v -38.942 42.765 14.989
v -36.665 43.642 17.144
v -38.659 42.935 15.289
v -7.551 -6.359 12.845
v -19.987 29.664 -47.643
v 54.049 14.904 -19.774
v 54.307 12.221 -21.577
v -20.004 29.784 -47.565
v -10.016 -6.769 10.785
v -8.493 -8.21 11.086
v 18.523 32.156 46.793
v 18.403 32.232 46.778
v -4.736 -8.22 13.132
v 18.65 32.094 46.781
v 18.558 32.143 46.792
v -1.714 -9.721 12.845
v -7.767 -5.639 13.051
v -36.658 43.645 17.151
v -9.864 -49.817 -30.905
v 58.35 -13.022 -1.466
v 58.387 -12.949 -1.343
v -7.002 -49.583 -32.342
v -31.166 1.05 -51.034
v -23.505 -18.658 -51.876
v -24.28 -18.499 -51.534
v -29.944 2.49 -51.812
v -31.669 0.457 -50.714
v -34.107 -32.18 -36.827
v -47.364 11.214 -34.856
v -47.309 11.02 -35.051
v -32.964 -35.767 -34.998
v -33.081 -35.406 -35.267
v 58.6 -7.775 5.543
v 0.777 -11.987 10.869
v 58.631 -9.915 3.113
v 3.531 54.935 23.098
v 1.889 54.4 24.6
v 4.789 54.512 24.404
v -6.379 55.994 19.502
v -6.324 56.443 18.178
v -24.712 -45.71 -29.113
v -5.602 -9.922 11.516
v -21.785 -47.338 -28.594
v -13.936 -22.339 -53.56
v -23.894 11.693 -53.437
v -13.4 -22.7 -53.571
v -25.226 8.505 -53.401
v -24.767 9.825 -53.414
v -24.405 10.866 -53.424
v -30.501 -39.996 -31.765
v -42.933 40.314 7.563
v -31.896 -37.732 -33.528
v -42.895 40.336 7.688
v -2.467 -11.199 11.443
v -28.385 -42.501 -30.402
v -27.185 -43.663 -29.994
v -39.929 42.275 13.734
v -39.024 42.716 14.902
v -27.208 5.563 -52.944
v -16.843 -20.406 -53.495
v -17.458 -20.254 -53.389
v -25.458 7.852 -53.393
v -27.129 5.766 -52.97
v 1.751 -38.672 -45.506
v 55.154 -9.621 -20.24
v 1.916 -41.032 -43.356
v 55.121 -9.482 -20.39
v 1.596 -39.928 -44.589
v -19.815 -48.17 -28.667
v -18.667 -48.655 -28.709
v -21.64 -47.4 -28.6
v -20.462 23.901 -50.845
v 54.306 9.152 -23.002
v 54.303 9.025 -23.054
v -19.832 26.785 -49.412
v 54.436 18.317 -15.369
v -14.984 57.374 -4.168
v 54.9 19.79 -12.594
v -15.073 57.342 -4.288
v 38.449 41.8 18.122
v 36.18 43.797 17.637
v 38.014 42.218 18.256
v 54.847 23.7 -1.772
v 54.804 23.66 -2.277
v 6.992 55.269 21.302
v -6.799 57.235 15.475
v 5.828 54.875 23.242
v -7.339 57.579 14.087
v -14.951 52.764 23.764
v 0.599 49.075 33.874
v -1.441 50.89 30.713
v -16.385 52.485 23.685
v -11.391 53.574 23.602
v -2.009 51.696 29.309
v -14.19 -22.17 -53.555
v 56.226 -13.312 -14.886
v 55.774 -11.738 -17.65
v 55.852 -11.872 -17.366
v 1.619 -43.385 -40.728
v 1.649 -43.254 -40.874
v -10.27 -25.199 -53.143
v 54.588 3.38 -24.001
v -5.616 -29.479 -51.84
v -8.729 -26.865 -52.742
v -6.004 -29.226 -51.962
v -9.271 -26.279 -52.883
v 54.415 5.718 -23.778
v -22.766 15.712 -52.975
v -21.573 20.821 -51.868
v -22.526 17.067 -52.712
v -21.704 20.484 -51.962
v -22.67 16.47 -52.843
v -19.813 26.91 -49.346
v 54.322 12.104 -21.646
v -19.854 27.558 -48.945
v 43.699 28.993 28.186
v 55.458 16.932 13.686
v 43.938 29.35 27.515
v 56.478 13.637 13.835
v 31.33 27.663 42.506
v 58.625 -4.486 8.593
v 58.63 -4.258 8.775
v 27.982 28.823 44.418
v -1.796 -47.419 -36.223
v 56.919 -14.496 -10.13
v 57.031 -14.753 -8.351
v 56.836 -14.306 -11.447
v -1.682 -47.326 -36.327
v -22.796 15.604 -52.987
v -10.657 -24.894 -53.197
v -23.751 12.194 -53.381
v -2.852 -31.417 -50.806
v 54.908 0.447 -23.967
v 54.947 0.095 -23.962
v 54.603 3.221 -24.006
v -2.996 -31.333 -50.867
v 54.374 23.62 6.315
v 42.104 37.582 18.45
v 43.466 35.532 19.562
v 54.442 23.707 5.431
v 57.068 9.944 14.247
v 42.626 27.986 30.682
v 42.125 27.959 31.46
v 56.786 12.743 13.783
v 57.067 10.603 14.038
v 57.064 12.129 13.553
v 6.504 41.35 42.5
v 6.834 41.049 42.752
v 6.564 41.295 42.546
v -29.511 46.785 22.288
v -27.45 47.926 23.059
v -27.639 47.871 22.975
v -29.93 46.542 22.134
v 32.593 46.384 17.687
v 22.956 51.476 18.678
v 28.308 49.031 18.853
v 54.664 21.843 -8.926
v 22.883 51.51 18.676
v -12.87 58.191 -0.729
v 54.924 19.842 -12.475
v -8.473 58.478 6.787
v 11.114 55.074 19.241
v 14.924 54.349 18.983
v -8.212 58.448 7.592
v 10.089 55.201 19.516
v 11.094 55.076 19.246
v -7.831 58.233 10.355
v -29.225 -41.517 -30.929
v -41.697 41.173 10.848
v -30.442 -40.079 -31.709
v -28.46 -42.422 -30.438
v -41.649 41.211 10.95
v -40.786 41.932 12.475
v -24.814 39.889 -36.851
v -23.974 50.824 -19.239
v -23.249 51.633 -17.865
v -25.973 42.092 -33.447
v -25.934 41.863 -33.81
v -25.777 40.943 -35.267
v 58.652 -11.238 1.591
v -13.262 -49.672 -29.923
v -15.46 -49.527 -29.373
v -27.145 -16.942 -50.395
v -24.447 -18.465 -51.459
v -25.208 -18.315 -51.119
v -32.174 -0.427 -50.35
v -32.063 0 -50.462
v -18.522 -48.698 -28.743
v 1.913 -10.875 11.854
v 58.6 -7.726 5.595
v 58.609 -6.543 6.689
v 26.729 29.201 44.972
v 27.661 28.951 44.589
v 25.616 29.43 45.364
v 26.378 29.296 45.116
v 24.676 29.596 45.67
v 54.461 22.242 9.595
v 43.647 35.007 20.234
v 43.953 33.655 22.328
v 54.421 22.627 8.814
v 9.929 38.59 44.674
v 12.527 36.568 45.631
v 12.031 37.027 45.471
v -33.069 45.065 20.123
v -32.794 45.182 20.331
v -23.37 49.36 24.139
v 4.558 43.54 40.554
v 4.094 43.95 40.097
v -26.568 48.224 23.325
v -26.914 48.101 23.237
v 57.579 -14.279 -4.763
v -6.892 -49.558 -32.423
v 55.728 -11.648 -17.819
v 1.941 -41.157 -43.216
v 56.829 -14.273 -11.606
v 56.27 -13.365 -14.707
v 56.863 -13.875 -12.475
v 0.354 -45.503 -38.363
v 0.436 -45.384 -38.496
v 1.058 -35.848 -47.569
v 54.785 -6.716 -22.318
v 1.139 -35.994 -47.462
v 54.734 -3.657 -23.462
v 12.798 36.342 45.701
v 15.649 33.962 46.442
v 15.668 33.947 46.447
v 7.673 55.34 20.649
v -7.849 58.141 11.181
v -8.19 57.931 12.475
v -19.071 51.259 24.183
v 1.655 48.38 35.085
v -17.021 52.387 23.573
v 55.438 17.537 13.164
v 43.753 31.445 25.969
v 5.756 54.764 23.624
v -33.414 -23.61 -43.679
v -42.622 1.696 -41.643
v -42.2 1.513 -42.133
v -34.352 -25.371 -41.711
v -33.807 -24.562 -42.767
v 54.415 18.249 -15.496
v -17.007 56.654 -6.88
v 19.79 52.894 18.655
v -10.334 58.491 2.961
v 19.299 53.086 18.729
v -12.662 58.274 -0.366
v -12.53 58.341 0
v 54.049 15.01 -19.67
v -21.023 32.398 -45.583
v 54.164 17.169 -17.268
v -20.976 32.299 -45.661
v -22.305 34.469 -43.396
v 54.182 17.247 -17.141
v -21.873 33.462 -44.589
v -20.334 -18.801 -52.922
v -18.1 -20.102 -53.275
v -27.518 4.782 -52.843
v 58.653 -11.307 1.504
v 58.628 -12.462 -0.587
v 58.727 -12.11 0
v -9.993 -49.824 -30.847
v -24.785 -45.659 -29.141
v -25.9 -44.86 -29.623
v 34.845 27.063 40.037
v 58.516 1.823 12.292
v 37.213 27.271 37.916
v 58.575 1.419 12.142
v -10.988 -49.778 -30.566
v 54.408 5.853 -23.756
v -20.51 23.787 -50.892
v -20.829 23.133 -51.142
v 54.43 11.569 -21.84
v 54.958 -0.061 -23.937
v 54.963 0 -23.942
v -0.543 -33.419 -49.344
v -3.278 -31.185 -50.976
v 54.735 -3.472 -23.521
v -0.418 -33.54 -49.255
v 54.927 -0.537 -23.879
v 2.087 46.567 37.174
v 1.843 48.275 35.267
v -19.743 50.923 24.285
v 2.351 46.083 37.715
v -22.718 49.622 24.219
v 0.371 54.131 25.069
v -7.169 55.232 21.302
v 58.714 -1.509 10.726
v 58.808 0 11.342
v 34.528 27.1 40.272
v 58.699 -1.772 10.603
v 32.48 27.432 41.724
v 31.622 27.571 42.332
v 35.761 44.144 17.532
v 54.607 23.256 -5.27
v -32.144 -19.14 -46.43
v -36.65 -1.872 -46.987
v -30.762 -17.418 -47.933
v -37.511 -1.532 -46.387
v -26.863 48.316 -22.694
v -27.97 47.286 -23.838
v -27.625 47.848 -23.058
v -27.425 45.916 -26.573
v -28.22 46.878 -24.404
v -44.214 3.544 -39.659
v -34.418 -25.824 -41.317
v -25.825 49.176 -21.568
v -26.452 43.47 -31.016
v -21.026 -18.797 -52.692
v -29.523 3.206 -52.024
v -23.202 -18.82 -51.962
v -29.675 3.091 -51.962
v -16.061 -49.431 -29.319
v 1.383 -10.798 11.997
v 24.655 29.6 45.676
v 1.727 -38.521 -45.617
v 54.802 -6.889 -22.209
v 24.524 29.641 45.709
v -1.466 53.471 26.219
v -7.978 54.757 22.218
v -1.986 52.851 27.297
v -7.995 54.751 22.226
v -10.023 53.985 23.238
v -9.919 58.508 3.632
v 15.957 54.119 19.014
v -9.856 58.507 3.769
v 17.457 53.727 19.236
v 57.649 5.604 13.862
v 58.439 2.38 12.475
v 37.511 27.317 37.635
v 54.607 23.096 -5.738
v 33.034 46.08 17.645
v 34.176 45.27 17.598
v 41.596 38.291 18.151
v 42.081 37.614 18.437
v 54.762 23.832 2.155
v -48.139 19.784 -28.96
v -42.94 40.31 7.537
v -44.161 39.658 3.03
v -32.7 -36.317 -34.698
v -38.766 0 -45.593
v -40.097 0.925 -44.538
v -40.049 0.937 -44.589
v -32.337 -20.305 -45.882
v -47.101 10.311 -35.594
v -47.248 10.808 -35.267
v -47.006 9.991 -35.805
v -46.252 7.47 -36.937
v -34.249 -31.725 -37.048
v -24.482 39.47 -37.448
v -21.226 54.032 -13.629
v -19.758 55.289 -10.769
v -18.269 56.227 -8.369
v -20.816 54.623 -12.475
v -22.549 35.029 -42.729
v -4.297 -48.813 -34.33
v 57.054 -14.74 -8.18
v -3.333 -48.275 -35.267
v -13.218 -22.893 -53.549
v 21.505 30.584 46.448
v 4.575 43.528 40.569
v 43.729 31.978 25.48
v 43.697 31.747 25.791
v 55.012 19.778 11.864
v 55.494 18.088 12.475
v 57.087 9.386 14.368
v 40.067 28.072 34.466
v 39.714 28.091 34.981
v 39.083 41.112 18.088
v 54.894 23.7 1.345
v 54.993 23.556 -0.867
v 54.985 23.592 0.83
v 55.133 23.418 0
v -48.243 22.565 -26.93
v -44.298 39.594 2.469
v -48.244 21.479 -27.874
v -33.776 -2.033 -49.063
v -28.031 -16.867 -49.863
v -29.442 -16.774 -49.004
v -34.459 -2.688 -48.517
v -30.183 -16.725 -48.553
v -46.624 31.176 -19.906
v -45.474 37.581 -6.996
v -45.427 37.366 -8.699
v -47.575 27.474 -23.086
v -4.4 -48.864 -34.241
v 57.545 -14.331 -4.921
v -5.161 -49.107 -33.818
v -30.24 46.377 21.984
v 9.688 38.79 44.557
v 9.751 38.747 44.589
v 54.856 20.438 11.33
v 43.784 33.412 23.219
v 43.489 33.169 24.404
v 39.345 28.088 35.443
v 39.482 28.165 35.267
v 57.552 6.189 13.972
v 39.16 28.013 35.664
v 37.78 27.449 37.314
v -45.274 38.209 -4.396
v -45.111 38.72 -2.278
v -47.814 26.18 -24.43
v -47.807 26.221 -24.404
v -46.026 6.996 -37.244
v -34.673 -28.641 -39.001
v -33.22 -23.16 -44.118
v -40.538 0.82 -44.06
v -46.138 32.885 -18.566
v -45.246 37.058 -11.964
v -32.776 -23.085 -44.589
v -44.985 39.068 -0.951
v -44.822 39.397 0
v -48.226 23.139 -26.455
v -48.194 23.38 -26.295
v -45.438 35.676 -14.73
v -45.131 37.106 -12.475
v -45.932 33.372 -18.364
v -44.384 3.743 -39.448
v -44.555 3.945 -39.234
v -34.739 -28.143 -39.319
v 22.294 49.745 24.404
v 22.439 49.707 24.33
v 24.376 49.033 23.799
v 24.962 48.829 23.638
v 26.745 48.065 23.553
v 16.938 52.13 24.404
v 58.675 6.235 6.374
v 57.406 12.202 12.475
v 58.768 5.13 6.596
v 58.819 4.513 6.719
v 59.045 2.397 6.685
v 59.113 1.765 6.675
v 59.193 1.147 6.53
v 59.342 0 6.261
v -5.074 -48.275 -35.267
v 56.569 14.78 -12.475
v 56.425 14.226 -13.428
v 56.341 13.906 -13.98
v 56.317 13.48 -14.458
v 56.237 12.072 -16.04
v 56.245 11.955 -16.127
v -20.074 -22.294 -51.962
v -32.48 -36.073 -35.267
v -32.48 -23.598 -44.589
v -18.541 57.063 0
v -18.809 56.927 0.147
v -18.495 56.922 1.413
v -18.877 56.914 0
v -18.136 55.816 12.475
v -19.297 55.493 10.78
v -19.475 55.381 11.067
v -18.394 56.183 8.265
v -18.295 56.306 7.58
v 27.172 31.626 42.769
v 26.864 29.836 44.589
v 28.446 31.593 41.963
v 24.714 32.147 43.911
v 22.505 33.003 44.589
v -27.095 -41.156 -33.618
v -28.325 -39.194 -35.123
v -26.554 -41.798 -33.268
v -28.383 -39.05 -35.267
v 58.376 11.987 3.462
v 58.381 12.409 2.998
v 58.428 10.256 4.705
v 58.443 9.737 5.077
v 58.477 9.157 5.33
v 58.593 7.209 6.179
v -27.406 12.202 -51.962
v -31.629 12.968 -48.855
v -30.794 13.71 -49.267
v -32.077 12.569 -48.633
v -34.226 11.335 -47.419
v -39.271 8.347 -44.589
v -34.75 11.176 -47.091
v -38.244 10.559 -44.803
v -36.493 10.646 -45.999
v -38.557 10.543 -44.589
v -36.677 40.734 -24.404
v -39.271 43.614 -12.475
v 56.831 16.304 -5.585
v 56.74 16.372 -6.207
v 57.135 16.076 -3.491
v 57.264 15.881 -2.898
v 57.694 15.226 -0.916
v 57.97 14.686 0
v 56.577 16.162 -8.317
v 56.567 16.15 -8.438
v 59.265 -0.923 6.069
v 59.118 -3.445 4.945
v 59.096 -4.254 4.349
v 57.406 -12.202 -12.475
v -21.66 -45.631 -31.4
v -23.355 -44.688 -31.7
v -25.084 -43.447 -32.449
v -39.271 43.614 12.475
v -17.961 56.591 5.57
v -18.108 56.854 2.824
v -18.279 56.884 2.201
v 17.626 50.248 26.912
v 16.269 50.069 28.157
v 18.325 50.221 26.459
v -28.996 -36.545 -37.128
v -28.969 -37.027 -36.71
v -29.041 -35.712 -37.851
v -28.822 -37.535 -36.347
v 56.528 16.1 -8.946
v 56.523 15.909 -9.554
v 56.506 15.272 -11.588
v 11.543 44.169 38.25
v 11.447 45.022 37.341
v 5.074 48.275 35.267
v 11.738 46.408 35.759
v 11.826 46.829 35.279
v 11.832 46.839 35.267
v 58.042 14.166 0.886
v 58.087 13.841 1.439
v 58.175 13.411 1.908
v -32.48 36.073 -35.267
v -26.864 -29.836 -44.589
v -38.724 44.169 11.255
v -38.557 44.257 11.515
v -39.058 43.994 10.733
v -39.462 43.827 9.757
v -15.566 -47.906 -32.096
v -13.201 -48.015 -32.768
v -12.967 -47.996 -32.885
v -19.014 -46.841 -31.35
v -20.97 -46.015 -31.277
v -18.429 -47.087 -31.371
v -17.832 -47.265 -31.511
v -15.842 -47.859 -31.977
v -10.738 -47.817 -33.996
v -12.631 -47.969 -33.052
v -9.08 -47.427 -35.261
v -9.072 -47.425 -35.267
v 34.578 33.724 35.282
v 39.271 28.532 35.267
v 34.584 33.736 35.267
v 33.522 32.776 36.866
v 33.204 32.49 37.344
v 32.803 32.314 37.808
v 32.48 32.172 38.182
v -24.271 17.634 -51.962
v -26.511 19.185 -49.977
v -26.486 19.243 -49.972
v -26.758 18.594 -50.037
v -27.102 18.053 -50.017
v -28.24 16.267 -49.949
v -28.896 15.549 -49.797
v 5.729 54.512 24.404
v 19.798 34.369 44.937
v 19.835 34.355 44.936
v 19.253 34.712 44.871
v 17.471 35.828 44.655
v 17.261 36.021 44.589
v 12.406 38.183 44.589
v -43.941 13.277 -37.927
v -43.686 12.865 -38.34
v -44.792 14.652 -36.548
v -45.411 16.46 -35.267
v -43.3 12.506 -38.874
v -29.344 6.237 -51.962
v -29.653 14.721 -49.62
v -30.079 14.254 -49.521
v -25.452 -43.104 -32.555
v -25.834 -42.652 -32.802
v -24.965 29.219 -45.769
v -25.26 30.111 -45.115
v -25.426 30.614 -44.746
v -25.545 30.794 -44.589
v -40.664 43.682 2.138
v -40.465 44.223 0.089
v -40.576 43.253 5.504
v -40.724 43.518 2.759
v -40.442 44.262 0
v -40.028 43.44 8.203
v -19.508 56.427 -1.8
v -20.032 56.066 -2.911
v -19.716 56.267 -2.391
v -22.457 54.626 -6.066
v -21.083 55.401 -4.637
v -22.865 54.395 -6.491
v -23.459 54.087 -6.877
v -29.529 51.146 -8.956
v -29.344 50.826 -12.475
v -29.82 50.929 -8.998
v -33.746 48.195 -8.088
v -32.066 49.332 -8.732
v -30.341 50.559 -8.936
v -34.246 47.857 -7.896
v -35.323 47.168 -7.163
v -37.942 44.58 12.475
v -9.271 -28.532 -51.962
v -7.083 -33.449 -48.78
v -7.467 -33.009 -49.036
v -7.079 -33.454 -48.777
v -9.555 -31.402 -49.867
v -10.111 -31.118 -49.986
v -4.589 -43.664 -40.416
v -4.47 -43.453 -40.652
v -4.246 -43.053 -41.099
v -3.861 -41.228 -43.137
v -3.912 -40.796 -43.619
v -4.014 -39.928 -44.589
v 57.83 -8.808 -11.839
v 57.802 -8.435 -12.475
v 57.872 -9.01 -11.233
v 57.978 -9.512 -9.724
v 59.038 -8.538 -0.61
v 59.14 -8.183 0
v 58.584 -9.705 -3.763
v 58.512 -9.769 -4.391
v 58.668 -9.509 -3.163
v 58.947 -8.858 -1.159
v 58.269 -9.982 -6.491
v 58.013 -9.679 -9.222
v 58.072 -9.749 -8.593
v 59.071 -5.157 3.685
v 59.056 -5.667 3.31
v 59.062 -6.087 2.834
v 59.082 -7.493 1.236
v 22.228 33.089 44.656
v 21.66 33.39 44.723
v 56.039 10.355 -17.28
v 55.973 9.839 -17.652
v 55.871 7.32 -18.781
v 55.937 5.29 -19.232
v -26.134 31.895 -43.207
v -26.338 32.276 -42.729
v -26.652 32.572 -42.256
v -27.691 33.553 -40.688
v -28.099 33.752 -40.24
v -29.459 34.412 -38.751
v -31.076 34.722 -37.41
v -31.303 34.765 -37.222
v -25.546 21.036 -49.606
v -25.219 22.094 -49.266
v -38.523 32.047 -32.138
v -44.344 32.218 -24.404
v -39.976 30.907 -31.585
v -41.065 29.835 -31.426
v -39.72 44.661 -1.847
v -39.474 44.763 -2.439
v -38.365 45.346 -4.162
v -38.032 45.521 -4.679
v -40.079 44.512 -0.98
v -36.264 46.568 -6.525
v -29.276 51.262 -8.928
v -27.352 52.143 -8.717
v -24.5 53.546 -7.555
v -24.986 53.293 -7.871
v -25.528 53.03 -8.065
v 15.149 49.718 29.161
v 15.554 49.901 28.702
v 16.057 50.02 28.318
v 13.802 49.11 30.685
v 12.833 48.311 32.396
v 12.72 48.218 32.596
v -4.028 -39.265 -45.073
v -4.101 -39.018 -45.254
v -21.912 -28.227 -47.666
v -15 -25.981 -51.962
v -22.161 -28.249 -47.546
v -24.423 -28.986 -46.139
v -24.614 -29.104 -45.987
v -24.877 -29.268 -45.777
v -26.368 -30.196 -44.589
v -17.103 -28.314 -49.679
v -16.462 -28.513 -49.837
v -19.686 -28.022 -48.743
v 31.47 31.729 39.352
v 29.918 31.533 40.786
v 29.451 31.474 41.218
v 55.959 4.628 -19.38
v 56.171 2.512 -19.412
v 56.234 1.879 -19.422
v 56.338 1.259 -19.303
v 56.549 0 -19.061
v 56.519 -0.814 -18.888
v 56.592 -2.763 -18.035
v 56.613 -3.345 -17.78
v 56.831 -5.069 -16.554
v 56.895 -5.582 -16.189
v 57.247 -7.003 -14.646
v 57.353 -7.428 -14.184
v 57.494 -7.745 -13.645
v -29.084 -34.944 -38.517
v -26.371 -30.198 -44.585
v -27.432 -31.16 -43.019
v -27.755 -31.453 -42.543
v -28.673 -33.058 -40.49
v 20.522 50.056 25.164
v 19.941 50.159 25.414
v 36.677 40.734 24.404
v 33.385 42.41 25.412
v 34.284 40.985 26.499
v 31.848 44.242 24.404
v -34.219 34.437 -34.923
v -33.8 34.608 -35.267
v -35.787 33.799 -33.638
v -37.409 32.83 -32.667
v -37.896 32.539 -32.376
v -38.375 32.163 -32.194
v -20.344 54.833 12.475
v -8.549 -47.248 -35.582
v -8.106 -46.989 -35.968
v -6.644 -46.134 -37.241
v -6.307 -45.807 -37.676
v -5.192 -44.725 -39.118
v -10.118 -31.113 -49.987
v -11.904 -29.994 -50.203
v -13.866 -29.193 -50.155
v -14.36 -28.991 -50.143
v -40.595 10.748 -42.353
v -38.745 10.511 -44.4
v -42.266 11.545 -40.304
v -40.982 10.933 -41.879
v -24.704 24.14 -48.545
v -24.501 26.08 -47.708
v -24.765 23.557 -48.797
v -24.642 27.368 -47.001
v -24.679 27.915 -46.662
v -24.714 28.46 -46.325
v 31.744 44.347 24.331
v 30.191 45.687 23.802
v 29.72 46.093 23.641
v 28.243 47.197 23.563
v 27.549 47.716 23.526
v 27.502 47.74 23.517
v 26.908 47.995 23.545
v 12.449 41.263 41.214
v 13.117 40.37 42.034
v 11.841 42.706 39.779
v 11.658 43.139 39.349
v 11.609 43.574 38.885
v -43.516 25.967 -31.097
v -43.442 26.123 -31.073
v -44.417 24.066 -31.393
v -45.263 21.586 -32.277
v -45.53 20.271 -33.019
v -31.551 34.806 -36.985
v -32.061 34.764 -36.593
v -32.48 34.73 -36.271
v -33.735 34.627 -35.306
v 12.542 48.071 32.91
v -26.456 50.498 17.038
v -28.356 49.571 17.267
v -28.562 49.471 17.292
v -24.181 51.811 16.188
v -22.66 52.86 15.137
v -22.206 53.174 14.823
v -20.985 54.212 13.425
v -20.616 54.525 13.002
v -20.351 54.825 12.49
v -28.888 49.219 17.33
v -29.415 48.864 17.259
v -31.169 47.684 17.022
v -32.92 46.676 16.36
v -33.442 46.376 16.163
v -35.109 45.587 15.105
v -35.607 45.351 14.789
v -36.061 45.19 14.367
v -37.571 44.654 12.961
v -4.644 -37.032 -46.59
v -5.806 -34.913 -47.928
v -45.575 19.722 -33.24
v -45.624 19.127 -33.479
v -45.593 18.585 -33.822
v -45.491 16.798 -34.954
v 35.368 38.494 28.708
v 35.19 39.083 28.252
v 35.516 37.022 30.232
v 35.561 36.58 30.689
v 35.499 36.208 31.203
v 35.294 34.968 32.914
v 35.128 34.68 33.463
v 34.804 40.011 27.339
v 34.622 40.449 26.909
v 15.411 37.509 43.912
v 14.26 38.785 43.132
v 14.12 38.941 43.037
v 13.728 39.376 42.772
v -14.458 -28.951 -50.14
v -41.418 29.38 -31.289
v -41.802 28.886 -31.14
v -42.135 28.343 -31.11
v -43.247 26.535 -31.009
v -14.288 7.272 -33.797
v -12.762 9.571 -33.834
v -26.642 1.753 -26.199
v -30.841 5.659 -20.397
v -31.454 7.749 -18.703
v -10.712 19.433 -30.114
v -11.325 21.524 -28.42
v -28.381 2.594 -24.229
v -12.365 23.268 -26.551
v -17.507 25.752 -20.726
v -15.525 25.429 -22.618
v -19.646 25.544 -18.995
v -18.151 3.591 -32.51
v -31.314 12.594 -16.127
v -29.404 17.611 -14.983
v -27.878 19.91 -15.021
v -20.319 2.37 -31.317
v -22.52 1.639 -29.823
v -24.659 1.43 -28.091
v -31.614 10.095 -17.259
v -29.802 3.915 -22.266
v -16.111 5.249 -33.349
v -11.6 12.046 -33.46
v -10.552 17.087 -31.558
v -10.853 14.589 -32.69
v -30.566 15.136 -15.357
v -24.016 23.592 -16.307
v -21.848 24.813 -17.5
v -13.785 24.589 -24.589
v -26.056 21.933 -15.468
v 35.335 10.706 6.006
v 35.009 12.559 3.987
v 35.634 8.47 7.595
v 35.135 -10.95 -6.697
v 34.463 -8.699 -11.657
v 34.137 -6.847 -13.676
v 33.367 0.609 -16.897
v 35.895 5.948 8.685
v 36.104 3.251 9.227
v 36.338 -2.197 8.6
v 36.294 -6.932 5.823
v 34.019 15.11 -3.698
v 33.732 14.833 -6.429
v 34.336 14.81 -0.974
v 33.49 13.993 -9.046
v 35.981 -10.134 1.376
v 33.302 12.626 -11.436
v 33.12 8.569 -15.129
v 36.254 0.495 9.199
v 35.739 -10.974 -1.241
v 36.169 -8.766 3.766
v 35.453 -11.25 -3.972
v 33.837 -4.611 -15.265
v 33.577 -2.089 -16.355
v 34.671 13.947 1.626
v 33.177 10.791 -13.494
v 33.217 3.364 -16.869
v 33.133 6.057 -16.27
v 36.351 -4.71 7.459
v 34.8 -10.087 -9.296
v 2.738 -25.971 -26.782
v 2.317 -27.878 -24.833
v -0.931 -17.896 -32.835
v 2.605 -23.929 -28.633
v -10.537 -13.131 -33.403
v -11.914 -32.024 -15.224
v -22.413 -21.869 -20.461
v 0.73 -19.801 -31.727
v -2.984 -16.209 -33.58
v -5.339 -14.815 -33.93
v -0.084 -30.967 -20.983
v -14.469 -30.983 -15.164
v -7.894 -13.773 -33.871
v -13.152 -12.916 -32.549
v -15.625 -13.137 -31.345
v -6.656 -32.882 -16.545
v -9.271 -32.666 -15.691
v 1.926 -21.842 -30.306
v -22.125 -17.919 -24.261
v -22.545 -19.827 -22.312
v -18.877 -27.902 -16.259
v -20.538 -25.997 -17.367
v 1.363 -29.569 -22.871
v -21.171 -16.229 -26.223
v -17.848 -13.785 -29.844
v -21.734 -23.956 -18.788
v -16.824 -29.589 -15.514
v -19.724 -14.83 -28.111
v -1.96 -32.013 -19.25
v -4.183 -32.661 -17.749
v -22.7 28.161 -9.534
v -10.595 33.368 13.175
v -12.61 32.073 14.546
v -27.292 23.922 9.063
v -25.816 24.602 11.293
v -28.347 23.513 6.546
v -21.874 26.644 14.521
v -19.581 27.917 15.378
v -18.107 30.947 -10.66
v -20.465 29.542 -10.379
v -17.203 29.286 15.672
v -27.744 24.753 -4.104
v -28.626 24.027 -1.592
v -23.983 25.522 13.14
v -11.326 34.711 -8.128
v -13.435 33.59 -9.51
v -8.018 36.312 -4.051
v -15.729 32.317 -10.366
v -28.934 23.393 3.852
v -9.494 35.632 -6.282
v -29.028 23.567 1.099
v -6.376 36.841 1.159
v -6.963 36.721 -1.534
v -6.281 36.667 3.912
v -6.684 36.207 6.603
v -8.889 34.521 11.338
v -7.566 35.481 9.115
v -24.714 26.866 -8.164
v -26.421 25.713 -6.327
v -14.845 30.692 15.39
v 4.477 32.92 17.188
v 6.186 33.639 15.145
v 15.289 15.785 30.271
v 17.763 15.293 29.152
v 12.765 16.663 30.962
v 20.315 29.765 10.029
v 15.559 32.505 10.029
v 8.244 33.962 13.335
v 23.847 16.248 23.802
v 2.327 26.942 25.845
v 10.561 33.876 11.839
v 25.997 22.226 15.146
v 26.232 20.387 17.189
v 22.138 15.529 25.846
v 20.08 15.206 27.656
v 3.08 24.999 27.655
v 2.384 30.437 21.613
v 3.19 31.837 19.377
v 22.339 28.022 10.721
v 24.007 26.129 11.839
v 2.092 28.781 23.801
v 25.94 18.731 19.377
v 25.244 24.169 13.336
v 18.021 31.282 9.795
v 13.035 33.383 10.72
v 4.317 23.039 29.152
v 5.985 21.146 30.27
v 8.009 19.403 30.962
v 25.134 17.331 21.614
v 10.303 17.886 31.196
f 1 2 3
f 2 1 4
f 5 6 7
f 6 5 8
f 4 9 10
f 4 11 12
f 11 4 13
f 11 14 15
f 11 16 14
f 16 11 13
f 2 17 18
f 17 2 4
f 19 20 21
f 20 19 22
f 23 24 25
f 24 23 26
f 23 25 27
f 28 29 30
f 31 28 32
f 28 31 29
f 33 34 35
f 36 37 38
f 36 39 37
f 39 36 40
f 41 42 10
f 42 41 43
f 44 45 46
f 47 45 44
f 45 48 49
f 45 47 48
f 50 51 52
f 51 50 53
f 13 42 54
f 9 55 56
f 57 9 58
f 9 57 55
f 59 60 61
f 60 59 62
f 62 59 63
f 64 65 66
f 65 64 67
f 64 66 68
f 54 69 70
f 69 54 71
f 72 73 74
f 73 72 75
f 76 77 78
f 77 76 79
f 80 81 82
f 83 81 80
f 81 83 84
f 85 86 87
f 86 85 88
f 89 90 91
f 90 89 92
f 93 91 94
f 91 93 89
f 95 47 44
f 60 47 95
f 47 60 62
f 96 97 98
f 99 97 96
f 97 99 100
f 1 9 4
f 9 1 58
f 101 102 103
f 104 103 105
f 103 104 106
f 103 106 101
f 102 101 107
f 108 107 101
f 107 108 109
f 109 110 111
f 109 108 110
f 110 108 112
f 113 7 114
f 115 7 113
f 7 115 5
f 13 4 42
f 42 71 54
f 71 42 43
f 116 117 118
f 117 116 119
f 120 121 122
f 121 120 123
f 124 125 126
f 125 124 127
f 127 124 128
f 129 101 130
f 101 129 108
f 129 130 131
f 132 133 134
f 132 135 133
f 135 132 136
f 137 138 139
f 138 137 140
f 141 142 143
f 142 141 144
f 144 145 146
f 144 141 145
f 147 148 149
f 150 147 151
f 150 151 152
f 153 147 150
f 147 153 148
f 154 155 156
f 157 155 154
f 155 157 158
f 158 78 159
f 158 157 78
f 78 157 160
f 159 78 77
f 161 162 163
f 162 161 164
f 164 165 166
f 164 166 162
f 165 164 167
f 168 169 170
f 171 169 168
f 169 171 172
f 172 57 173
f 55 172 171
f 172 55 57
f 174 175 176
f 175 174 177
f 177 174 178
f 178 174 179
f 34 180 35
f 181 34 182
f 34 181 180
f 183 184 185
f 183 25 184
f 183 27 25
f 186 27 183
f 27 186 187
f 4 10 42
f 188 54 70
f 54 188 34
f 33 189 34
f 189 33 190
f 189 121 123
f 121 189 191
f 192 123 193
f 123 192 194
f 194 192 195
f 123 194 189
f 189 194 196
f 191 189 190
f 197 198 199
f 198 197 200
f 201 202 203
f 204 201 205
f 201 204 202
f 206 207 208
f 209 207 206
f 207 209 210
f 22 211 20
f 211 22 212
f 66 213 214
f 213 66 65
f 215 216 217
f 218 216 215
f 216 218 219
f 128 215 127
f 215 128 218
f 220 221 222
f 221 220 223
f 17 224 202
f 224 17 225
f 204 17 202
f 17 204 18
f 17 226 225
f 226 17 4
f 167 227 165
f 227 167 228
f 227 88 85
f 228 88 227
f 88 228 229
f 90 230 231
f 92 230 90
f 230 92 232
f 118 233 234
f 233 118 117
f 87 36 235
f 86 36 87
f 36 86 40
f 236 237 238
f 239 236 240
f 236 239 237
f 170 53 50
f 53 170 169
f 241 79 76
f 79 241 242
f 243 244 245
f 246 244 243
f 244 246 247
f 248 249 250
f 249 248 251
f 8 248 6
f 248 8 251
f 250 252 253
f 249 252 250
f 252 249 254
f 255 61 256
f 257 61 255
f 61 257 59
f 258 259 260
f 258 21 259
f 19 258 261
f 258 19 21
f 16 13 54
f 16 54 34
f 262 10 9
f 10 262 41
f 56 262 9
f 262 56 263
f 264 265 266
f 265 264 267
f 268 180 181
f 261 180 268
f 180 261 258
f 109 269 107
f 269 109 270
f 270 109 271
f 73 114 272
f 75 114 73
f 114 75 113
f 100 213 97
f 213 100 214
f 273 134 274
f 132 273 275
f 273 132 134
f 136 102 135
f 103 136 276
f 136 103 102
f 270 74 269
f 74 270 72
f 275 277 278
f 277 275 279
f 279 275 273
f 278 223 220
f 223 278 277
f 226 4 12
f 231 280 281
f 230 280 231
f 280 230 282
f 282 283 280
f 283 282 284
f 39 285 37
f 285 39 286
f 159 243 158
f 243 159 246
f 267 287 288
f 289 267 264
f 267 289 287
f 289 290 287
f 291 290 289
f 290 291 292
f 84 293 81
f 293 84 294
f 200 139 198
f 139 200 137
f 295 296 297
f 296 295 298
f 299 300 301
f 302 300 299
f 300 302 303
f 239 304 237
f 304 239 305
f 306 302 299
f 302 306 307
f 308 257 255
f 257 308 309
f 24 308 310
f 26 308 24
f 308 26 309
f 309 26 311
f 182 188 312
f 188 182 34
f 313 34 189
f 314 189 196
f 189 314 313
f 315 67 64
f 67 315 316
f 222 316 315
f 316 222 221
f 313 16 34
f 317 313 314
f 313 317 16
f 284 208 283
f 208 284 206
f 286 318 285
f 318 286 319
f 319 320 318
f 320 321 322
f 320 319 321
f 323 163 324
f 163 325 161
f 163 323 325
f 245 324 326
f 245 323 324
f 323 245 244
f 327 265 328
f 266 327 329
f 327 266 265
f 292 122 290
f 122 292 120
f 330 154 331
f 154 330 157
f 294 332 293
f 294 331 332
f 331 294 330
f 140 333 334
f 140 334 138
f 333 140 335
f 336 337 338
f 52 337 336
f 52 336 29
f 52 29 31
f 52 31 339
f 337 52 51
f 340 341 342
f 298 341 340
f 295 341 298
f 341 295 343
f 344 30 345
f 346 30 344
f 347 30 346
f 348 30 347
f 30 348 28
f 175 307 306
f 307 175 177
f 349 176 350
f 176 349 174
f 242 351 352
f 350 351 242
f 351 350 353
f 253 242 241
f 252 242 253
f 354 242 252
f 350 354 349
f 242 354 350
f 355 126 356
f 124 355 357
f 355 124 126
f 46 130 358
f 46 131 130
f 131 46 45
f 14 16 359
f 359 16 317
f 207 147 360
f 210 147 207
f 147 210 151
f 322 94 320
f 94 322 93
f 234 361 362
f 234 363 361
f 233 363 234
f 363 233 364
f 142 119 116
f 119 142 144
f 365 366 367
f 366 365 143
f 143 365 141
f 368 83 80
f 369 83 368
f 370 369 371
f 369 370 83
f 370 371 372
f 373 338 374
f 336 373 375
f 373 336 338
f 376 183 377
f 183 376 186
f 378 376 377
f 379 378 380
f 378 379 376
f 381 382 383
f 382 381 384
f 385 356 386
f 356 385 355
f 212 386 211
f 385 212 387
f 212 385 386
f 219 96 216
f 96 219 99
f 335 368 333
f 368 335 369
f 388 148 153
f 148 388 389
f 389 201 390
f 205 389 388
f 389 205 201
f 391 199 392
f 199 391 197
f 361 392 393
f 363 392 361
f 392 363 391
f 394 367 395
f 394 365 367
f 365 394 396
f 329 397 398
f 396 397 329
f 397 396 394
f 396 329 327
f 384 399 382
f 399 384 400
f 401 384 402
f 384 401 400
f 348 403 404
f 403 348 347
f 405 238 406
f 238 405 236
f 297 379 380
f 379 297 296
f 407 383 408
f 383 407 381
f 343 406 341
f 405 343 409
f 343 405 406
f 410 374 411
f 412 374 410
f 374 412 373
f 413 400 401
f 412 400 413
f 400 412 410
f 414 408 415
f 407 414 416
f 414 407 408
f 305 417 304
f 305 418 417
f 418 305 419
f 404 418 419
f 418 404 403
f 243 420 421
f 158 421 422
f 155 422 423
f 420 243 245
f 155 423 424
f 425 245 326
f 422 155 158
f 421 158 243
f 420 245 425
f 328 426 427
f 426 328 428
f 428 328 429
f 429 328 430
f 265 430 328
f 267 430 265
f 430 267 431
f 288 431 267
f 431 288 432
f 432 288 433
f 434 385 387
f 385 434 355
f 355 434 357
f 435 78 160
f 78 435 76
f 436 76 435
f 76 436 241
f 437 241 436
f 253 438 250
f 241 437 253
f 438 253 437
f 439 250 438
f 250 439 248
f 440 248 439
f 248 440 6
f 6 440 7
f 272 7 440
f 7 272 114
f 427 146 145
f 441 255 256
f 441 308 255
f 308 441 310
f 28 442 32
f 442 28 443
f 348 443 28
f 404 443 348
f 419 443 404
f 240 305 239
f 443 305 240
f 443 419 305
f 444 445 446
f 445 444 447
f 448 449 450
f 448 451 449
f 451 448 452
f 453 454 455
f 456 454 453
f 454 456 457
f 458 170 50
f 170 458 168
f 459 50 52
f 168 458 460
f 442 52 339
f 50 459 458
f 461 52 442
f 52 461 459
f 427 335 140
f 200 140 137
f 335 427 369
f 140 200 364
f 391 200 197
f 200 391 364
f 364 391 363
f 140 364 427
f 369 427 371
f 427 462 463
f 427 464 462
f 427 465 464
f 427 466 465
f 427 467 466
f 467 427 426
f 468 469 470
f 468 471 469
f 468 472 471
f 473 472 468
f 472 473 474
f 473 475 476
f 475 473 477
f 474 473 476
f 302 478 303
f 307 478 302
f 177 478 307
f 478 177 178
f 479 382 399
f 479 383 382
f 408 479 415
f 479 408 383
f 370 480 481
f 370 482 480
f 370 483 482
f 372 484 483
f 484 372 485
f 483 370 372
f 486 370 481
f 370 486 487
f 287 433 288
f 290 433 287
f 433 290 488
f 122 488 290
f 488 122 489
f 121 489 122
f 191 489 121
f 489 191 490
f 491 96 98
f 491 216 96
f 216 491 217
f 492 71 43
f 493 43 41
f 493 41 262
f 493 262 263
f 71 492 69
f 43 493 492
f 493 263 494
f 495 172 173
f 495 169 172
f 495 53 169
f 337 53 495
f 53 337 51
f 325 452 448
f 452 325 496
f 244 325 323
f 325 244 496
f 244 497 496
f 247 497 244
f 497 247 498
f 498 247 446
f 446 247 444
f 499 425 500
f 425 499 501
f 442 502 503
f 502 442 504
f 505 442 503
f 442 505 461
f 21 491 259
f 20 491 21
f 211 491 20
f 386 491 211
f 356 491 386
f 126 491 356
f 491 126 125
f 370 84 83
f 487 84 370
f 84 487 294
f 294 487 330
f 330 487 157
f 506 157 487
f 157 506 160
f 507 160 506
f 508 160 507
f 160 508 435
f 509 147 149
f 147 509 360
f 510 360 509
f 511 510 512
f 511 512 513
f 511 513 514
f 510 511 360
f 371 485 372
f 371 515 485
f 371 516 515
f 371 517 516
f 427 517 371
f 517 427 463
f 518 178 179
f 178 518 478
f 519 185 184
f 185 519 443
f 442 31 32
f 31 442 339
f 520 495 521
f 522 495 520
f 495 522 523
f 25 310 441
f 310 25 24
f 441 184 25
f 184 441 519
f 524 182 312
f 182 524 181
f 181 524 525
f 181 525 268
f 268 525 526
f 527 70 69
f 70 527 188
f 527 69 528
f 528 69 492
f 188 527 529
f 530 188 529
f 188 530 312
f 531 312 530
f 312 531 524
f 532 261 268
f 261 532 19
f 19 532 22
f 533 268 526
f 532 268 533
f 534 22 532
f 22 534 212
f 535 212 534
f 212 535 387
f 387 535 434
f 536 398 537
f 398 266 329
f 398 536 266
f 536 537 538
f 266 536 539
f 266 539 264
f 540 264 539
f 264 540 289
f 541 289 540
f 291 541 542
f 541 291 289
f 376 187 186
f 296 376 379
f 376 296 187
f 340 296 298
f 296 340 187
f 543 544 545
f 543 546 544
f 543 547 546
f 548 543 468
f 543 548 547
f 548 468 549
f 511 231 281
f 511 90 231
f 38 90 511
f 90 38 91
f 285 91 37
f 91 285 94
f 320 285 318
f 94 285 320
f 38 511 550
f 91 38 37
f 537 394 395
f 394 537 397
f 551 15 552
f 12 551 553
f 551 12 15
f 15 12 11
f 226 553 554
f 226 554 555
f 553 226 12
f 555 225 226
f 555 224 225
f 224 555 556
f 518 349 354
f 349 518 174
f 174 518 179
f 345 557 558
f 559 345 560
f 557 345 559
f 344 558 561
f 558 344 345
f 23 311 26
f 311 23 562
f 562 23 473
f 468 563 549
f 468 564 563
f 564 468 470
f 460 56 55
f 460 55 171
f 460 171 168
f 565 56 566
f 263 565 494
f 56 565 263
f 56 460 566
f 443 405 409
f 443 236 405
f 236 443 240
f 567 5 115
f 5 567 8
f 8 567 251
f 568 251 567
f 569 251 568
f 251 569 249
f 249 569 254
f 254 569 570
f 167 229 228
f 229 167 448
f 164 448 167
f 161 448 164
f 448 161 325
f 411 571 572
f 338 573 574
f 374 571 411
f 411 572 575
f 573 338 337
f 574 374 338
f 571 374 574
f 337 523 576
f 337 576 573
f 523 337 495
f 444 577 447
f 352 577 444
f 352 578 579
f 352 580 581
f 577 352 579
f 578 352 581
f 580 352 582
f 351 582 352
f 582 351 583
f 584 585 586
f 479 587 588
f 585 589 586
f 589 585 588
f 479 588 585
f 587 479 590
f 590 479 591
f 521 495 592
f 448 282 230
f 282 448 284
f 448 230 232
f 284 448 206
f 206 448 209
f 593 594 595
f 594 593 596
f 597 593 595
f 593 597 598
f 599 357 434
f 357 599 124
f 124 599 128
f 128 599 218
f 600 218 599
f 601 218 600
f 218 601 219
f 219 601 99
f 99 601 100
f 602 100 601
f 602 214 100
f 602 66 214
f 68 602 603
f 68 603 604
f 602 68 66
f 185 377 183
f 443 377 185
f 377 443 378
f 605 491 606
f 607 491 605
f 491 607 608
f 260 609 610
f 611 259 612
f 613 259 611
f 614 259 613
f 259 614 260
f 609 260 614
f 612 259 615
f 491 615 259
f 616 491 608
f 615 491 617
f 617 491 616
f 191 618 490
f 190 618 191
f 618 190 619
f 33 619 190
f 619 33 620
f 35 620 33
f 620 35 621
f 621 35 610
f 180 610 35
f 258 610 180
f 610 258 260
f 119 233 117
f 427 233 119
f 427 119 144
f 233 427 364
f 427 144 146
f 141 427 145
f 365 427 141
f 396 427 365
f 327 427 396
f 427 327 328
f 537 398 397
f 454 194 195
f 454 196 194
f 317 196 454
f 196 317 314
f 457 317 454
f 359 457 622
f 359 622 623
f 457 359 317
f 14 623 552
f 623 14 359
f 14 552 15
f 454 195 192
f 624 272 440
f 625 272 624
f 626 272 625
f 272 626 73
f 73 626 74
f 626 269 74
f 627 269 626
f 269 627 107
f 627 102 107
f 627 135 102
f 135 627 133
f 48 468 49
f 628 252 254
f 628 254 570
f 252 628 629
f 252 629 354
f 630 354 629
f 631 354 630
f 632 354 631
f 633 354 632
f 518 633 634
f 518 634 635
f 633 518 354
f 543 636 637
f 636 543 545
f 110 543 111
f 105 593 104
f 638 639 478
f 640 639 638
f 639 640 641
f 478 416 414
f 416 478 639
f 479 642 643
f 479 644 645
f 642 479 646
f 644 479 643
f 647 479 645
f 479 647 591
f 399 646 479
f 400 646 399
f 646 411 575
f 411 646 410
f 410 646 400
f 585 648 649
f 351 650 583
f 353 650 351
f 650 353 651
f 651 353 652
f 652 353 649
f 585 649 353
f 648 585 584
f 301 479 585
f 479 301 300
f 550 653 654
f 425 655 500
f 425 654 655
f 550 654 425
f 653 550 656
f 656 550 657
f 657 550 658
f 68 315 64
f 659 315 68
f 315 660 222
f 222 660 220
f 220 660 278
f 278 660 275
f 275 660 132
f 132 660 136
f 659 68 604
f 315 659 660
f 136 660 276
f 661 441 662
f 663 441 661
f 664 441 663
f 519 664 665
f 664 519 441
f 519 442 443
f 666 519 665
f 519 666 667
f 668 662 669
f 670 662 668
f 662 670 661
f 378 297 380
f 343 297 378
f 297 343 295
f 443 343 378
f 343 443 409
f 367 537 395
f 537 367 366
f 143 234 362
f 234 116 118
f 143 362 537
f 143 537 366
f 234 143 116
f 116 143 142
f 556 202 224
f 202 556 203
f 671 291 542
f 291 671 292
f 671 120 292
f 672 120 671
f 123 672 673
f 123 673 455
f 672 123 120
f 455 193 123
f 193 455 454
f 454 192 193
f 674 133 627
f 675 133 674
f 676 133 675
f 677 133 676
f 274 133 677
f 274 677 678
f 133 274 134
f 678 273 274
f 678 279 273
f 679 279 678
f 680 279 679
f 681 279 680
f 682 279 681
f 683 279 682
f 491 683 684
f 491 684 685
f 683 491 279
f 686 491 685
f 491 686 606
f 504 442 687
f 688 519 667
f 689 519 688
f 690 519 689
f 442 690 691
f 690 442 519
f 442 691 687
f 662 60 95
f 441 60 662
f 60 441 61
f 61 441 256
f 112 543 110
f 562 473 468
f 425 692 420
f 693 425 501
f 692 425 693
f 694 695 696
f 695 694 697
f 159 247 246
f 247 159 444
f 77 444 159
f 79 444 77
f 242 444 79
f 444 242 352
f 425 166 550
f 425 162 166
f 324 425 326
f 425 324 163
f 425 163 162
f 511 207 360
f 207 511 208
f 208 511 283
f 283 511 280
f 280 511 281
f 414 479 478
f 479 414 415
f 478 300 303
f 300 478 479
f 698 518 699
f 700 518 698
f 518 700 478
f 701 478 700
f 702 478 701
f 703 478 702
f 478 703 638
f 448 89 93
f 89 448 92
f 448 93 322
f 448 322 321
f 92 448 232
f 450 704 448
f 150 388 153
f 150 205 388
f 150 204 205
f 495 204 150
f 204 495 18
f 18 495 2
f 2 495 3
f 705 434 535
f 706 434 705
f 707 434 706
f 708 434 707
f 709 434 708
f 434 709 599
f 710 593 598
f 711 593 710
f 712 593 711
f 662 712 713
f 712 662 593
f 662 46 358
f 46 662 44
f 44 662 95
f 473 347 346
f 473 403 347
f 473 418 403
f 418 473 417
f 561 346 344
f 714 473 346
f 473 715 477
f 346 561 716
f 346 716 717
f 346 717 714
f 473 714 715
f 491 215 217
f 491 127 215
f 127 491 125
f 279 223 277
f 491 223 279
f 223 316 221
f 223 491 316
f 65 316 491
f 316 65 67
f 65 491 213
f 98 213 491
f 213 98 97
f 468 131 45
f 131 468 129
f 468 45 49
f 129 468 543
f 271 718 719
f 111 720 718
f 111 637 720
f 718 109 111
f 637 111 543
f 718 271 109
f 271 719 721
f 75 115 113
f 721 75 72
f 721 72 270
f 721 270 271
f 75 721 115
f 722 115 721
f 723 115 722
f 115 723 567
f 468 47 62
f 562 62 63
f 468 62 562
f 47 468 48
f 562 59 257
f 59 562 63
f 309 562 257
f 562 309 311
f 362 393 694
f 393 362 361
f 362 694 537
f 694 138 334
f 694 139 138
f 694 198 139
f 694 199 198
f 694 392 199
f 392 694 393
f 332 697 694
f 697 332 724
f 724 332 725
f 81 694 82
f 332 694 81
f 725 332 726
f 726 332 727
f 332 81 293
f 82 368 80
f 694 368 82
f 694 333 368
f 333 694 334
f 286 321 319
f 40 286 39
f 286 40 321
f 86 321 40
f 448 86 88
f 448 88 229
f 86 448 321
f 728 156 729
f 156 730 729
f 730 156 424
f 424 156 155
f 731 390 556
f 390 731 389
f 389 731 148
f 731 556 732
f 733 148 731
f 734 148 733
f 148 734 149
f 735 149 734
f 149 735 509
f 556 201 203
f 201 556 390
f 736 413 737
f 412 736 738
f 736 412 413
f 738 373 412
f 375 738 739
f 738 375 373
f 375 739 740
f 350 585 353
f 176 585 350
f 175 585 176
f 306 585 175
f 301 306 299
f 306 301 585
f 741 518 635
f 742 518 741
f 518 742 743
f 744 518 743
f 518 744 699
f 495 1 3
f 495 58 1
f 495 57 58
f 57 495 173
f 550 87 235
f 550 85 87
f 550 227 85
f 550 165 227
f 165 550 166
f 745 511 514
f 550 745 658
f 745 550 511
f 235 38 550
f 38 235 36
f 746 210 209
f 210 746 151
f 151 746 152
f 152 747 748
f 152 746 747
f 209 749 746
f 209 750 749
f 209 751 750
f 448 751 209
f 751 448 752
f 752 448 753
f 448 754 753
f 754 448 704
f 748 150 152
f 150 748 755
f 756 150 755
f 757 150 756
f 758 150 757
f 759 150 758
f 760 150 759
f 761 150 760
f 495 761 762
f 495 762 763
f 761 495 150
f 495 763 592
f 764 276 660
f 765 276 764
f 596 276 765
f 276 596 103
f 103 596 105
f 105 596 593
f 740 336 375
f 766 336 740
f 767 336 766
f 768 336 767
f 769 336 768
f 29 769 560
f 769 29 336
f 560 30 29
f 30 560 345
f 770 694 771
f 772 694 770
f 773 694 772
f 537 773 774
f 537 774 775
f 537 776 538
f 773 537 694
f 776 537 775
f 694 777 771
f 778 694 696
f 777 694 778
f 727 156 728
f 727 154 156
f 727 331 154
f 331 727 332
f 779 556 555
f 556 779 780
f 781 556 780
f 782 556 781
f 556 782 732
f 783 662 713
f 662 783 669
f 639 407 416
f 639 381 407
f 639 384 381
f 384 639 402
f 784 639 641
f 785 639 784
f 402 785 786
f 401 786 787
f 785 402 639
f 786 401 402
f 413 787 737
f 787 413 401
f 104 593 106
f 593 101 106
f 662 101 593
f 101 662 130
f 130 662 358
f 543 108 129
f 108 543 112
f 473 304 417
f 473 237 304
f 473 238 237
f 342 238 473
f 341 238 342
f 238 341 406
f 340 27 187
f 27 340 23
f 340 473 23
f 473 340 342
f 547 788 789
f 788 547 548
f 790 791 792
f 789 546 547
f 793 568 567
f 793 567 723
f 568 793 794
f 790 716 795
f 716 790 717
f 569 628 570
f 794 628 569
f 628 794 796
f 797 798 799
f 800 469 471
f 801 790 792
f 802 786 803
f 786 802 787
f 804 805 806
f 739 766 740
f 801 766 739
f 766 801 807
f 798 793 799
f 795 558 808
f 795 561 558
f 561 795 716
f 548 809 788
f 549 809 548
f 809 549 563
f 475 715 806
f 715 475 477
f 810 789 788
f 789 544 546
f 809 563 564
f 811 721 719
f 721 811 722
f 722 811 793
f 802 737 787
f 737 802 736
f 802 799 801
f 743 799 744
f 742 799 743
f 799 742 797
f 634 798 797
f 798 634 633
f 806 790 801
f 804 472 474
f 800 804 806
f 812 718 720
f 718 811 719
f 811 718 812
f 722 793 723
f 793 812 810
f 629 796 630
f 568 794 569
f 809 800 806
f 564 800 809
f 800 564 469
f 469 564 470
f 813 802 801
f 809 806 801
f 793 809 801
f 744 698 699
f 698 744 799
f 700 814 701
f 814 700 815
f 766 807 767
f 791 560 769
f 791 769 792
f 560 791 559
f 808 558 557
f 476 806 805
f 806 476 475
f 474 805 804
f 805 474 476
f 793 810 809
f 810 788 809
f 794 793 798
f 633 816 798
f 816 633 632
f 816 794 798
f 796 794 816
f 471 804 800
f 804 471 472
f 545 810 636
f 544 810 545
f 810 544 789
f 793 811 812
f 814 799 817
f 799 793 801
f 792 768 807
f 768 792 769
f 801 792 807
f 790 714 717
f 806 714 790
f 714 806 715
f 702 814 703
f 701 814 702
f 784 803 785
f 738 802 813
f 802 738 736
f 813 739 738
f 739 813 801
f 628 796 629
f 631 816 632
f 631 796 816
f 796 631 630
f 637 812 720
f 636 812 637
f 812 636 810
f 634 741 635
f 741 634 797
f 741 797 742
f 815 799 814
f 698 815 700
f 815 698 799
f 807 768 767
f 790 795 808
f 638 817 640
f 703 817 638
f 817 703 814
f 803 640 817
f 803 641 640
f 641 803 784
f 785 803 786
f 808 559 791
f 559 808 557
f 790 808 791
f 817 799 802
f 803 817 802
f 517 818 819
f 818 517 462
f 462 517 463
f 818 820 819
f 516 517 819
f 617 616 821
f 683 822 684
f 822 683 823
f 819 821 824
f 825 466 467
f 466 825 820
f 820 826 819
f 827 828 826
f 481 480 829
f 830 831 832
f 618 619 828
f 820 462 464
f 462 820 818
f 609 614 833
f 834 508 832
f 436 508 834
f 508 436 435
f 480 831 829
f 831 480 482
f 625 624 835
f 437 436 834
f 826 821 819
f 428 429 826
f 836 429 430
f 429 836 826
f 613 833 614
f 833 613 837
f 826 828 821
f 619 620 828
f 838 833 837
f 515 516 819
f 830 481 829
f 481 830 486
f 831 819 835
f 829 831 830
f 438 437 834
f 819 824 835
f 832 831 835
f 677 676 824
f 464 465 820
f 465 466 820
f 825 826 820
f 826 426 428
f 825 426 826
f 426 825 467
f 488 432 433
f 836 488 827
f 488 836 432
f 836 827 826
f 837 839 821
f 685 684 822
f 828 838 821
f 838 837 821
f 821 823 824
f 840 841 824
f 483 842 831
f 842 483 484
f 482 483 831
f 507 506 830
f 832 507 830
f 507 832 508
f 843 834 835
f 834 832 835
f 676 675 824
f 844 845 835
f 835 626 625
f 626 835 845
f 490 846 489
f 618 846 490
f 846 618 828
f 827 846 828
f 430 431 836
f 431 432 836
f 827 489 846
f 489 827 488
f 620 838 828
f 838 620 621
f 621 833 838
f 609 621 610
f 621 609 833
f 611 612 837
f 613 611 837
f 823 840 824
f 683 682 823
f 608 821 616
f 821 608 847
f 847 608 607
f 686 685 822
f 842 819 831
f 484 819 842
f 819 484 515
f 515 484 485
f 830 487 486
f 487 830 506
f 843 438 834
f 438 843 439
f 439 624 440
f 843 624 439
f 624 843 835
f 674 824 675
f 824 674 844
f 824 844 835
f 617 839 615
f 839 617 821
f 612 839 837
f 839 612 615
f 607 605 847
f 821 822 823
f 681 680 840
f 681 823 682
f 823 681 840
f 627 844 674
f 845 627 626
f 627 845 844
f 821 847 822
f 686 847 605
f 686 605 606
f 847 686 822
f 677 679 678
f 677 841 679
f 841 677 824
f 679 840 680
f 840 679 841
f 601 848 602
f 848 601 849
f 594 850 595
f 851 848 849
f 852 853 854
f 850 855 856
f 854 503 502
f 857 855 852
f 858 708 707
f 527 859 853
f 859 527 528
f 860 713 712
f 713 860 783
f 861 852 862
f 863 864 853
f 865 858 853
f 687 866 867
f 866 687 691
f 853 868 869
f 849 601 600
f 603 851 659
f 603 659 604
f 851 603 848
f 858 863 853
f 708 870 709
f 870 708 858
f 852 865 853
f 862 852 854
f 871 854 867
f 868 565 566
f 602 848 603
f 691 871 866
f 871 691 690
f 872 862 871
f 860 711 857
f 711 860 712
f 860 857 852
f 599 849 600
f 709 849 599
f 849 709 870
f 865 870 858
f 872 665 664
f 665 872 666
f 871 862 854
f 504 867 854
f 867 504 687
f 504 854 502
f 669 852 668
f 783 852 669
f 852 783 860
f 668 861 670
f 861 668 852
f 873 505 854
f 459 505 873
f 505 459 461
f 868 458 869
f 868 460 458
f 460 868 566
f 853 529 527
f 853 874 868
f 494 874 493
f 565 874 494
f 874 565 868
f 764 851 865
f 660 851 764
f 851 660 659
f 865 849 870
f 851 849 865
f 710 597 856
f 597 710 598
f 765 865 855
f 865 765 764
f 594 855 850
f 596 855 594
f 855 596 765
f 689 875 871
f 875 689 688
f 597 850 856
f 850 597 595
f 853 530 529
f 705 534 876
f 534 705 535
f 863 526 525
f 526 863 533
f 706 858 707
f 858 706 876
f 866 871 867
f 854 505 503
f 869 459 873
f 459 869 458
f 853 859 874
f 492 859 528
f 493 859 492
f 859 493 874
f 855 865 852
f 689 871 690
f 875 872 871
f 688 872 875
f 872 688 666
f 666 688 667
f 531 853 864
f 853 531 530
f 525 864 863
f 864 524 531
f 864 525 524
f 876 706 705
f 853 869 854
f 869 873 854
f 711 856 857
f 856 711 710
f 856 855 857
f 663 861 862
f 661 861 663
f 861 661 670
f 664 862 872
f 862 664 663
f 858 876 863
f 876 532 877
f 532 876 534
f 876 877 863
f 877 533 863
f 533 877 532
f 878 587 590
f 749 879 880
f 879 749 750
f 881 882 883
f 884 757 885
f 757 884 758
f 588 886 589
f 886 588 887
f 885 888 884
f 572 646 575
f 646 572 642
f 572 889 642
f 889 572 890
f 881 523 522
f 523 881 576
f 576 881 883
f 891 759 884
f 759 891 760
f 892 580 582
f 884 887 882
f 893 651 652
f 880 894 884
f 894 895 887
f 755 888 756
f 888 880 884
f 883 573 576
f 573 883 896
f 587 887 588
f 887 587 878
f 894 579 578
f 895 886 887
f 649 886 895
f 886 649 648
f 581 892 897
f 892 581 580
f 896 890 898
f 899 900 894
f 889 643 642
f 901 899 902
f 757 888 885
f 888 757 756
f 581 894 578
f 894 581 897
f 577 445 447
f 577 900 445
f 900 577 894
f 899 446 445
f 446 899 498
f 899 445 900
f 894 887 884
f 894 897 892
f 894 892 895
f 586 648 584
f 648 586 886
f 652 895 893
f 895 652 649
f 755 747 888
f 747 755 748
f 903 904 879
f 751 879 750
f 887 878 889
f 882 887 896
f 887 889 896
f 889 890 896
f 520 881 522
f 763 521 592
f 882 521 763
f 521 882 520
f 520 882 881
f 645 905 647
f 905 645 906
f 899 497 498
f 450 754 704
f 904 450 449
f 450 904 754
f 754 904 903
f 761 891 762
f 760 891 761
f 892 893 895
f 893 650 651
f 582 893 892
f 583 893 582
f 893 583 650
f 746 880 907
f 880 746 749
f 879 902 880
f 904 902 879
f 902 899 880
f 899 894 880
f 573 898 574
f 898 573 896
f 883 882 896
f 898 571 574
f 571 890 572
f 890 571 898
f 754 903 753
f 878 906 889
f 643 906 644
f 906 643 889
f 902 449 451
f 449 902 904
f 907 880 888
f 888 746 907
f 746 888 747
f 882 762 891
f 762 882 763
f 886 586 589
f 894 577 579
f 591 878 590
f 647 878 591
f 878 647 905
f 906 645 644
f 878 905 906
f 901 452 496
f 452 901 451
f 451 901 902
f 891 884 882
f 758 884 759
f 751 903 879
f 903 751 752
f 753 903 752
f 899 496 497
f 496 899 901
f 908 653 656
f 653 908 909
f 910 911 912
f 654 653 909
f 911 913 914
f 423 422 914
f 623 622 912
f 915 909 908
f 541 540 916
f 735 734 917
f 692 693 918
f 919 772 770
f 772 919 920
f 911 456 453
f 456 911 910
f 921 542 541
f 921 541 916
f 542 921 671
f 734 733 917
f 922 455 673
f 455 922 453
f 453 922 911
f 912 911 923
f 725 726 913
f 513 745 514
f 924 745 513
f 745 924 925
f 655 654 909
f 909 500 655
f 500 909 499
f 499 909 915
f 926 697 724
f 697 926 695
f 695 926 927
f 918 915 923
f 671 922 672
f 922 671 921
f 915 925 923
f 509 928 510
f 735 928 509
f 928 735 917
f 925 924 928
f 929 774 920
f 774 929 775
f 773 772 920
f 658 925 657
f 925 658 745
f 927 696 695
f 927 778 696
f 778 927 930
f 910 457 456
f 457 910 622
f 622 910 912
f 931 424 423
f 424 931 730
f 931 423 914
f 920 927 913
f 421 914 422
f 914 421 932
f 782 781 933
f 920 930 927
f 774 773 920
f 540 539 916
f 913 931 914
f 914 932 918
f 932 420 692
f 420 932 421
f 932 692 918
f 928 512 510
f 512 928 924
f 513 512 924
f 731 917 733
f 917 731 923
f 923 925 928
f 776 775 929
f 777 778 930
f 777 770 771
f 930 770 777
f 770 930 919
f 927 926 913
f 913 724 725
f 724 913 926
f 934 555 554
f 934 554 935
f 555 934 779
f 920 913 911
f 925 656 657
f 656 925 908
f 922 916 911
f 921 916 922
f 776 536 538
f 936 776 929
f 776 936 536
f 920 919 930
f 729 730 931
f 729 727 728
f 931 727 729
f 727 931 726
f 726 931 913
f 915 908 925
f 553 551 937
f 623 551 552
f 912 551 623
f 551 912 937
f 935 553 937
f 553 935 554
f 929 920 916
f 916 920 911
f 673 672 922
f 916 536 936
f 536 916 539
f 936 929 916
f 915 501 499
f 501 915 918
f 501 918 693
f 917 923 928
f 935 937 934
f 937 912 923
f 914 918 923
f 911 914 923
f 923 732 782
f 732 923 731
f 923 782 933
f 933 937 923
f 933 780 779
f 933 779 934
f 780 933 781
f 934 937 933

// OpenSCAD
difference() {
	intersection() {
		hull() {
			rotate(a = -118.9051365199, v = [-0.8754084129, 0.0047311662, 0.0000000000]) {
				rotate(a = -90.0000000000, v = [-0.7933533403, 0.6087614290, 0.0000000000]) {
					cylinder(h = 60, r = 16.2000000000);
				}
			}
			rotate(a = -118.9051365199, v = [-0.8754084129, 0.0047311662, 0.0000000000]) {
				rotate(a = -90.0000000000, v = [-0.1305261922, -0.9914448614, 0.0000000000]) {
					cylinder(h = 60, r = 16.2000000000);
				}
			}
			rotate(a = -118.9051365199, v = [-0.8754084129, 0.0047311662, 0.0000000000]) {
				rotate(a = -24.0657434263, v = [-0.2954832486, 0.2810301414, 0.0000000000]) {
					cylinder(h = 60, r = 16.2000000000);
				}
			}
			rotate(a = -118.9051365199, v = [-0.8754084129, 0.0047311662, 0.0000000000]) {
				rotate(a = -141.7661142776, v = [-0.3491712756, 0.5109630911, 0.0000000000]) {
					cylinder(h = 60, r = 16.2000000000);
				}
			}
			rotate(a = -118.9051365199, v = [-0.8754084129, 0.0047311662, 0.0000000000]) {
				rotate(a = -154.1384175201, v = [0.1698982562, -0.4017508387, 0.0000000000]) {
					cylinder(h = 60, r = 16.2000000000);
				}
			}
		}
		sphere(r = 60);
	}
	union() {
		rotate(a = -118.9051365199, v = [-0.8754084129, 0.0047311662, 0.0000000000]) {
			rotate(a = -90.0000000000, v = [-0.7933533403, 0.6087614290, 0.0000000000]) {
				translate(v = [0, 0, 35]) {
					cylinder(h = 100, r = 13.2000000000);
				}
			}
		}
		rotate(a = -118.9051365199, v = [-0.8754084129, 0.0047311662, 0.0000000000]) {
			rotate(a = -90.0000000000, v = [-0.1305261922, -0.9914448614, 0.0000000000]) {
				translate(v = [0, 0, 35]) {
					cylinder(h = 100, r = 13.2000000000);
				}
			}
		}
		rotate(a = -118.9051365199, v = [-0.8754084129, 0.0047311662, 0.0000000000]) {
			rotate(a = -24.0657434263, v = [-0.2954832486, 0.2810301414, 0.0000000000]) {
				translate(v = [0, 0, 35]) {
					cylinder(h = 100, r = 13.2000000000);
				}
			}
		}
		rotate(a = -118.9051365199, v = [-0.8754084129, 0.0047311662, 0.0000000000]) {
			rotate(a = -141.7661142776, v = [-0.3491712756, 0.5109630911, 0.0000000000]) {
				translate(v = [0, 0, 35]) {
					cylinder(h = 100, r = 13.2000000000);
				}
			}
		}
		rotate(a = -118.9051365199, v = [-0.8754084129, 0.0047311662, 0.0000000000]) {
			rotate(a = -154.1384175201, v = [0.1698982562, -0.4017508387, 0.0000000000]) {
				translate(v = [0, 0, 35]) {
					cylinder(h = 100, r = 13.2000000000);
				}
			}
		}
	}
}
